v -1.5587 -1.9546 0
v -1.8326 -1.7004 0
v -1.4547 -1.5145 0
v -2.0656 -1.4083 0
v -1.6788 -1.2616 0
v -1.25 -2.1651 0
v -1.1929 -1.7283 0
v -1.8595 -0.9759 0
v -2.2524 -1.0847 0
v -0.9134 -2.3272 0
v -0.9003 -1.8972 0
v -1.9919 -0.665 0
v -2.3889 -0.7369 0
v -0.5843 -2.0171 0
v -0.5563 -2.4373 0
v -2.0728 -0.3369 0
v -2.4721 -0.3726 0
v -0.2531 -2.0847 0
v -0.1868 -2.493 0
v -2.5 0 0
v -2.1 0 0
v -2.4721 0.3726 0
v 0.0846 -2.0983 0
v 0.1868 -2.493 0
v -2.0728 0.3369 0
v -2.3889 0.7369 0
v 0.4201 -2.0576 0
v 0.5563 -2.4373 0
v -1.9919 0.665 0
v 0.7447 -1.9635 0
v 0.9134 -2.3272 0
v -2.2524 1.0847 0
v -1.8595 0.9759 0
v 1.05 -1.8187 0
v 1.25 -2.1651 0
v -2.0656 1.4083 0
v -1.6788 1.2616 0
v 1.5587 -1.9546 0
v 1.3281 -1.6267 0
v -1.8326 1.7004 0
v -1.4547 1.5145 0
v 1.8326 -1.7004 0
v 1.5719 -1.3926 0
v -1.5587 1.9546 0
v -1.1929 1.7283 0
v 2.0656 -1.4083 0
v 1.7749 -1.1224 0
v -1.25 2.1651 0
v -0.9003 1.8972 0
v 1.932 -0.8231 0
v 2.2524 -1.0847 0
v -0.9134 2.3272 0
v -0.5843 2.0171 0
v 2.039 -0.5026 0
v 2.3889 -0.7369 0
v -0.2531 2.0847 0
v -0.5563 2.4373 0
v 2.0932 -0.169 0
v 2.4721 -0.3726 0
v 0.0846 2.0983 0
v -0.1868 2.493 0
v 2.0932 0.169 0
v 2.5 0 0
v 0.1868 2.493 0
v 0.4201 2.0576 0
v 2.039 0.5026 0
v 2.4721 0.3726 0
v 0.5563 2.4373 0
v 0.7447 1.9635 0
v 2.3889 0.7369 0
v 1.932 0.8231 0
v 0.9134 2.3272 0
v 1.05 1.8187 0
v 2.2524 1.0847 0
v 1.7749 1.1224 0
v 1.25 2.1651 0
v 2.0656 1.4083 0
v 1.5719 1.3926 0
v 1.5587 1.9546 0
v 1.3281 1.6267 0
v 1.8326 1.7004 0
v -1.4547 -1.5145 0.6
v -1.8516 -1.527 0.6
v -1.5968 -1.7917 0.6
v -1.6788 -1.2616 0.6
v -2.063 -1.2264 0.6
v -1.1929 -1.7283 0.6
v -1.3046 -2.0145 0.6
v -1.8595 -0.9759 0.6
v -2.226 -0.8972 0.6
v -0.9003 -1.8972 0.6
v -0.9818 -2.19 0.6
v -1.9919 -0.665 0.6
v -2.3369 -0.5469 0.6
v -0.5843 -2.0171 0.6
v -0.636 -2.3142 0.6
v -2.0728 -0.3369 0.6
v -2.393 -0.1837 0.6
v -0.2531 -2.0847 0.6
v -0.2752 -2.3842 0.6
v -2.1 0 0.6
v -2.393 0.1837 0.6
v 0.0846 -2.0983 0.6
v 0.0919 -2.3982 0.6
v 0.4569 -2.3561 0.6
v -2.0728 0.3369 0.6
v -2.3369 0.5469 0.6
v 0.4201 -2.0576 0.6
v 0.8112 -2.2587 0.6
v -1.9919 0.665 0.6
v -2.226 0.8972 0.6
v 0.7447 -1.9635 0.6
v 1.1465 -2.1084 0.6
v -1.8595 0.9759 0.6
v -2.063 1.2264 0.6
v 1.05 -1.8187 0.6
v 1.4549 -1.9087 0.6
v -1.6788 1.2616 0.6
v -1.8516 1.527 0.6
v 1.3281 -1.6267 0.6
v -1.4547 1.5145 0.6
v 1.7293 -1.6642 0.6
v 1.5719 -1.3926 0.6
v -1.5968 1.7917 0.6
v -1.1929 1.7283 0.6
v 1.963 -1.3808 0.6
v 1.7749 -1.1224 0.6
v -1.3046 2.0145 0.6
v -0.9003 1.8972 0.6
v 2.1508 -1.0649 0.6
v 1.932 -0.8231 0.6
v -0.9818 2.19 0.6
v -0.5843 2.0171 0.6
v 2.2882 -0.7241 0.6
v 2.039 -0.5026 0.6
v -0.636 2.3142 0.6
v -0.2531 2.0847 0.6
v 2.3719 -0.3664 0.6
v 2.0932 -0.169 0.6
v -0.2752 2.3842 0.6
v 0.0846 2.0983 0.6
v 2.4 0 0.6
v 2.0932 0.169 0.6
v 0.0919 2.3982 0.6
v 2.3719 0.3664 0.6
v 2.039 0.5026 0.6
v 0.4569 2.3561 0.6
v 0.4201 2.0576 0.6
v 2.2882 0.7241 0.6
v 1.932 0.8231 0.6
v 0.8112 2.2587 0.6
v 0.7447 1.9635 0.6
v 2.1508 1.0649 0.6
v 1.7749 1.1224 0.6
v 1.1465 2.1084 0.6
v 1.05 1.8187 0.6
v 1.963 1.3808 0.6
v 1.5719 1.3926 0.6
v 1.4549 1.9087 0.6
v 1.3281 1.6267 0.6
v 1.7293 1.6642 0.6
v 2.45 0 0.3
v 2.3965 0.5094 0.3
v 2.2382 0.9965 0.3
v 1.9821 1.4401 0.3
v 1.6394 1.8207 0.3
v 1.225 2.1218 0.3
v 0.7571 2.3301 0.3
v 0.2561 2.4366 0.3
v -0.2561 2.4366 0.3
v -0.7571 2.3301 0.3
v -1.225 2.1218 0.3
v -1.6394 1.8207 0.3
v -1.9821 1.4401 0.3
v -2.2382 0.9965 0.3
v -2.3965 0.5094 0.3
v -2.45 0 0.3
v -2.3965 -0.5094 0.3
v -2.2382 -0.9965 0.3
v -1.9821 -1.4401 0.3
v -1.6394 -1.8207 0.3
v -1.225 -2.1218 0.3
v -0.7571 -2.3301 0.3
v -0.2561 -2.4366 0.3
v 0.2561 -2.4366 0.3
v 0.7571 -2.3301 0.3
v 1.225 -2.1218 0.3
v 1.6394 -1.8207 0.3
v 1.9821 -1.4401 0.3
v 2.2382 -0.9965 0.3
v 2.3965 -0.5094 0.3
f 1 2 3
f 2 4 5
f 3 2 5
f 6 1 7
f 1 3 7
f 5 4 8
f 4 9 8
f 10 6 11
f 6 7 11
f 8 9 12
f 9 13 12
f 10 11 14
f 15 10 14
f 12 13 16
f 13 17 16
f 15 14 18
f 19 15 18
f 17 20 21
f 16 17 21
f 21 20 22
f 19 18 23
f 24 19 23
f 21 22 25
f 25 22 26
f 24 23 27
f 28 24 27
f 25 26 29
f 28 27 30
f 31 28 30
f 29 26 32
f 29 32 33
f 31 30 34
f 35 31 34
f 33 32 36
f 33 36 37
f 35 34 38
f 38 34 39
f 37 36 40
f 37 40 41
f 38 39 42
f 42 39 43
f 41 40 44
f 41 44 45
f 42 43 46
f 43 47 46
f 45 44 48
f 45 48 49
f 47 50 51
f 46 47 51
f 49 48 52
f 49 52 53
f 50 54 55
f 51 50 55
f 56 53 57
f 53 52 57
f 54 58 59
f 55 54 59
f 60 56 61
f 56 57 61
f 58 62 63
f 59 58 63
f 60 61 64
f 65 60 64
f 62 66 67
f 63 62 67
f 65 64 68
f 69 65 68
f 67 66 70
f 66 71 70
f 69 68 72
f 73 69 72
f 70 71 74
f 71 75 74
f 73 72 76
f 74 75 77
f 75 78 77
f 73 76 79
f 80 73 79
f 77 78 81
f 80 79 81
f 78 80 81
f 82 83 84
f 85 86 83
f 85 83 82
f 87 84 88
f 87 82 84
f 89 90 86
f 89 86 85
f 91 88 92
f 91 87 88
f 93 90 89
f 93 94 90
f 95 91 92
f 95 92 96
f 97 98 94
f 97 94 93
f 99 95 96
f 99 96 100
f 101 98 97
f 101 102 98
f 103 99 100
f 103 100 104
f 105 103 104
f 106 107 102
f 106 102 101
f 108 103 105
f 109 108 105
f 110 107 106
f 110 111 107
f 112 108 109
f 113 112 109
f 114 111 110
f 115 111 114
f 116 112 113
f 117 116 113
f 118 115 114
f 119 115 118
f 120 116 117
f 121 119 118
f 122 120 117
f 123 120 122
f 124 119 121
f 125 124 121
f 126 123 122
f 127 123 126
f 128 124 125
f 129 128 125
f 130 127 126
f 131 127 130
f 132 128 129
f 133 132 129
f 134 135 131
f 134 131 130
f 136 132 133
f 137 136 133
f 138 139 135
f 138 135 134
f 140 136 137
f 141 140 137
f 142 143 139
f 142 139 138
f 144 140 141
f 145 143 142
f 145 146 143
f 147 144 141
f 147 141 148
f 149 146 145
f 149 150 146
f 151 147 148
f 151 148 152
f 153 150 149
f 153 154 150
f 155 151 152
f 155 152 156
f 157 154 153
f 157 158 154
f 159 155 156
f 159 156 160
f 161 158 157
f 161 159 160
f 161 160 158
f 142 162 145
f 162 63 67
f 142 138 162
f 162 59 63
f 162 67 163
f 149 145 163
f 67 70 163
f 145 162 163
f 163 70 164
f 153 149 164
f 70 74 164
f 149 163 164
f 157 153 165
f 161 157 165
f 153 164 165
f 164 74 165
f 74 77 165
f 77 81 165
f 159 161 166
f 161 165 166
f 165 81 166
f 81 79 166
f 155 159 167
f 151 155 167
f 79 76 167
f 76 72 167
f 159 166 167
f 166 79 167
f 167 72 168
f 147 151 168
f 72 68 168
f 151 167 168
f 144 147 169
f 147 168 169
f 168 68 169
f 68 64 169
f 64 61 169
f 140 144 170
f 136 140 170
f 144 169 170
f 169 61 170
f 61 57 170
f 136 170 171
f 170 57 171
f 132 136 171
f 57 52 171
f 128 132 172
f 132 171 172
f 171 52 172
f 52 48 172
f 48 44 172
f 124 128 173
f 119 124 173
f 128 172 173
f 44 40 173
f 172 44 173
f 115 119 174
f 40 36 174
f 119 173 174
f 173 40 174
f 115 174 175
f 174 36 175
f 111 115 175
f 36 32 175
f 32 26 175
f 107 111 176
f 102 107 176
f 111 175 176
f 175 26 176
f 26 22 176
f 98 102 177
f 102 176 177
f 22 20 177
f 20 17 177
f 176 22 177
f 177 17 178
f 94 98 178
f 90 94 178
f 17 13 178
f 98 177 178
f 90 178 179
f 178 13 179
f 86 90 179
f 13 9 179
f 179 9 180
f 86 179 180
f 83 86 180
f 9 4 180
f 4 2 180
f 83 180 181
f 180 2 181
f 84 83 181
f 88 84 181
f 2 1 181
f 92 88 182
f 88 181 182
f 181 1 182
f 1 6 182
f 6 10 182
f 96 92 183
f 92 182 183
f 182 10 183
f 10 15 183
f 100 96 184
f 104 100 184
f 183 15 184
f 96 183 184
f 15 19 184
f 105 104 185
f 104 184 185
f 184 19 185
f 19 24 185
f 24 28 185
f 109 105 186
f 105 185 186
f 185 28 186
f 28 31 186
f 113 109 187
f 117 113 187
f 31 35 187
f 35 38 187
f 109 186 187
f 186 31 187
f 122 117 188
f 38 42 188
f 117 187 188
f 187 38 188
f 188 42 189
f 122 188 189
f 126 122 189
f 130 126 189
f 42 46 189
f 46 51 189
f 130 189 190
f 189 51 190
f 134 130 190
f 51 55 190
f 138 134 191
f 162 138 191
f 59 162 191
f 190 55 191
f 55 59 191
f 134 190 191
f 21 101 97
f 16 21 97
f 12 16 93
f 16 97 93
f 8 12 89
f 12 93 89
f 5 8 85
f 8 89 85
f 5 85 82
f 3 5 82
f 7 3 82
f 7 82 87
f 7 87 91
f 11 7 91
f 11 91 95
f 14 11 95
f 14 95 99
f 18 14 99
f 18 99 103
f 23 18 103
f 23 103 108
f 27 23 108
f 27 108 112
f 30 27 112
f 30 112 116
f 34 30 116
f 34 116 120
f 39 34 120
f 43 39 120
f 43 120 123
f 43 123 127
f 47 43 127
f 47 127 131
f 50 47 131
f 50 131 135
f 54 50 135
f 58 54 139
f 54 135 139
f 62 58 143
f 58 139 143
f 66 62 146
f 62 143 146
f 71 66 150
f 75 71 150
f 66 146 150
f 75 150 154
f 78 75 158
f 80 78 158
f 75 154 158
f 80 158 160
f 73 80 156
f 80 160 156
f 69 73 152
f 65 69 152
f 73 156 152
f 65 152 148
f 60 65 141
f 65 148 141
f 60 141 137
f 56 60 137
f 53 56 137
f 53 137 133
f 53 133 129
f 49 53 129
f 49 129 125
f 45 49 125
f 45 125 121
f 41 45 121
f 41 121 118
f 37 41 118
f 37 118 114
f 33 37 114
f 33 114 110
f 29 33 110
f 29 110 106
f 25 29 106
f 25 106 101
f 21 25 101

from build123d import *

# Parameters (mm, degrees)
F0_R     = 2.5
F1_DEPTH = 0.6
F2_D     = 4.2
F3_SIZE2 = 0.59999
F3_SIZE  = 0.09999


# Not quite as in the source:
# - a fillet or chamfer is up to 0.001 mm smaller than in the source, because OpenCascade refuses the exact size


with BuildPart() as f1:
    # F0 (on Top) → F1 (new body)
    with BuildSketch(Plane.XY):
        Circle(F0_R)
    extrude(amount=F1_DEPTH)

    # F2 (through all)
    with Locations(Plane(origin=(0, 0, 0), x_dir=(1, 0, 0), z_dir=(0, 0, -1))):
        with Locations((0, 0)):
            Hole(F2_D / 2)

    # F3 (size 0.1 and 0.6 in the source; OpenCascade refuses exactly that, so slightly less here)
    f3_edges = [f1.edges().sort_by_distance(p)[0] for p in [
        (-2.5, 0, 0.6),
    ]]
    f3_side = f1.faces().sort_by_distance((-2.429289, 0, 0.6))[0]
    chamfer(f3_edges, length=F3_SIZE, length2=F3_SIZE2, reference=f3_side)


solid = f1.part
